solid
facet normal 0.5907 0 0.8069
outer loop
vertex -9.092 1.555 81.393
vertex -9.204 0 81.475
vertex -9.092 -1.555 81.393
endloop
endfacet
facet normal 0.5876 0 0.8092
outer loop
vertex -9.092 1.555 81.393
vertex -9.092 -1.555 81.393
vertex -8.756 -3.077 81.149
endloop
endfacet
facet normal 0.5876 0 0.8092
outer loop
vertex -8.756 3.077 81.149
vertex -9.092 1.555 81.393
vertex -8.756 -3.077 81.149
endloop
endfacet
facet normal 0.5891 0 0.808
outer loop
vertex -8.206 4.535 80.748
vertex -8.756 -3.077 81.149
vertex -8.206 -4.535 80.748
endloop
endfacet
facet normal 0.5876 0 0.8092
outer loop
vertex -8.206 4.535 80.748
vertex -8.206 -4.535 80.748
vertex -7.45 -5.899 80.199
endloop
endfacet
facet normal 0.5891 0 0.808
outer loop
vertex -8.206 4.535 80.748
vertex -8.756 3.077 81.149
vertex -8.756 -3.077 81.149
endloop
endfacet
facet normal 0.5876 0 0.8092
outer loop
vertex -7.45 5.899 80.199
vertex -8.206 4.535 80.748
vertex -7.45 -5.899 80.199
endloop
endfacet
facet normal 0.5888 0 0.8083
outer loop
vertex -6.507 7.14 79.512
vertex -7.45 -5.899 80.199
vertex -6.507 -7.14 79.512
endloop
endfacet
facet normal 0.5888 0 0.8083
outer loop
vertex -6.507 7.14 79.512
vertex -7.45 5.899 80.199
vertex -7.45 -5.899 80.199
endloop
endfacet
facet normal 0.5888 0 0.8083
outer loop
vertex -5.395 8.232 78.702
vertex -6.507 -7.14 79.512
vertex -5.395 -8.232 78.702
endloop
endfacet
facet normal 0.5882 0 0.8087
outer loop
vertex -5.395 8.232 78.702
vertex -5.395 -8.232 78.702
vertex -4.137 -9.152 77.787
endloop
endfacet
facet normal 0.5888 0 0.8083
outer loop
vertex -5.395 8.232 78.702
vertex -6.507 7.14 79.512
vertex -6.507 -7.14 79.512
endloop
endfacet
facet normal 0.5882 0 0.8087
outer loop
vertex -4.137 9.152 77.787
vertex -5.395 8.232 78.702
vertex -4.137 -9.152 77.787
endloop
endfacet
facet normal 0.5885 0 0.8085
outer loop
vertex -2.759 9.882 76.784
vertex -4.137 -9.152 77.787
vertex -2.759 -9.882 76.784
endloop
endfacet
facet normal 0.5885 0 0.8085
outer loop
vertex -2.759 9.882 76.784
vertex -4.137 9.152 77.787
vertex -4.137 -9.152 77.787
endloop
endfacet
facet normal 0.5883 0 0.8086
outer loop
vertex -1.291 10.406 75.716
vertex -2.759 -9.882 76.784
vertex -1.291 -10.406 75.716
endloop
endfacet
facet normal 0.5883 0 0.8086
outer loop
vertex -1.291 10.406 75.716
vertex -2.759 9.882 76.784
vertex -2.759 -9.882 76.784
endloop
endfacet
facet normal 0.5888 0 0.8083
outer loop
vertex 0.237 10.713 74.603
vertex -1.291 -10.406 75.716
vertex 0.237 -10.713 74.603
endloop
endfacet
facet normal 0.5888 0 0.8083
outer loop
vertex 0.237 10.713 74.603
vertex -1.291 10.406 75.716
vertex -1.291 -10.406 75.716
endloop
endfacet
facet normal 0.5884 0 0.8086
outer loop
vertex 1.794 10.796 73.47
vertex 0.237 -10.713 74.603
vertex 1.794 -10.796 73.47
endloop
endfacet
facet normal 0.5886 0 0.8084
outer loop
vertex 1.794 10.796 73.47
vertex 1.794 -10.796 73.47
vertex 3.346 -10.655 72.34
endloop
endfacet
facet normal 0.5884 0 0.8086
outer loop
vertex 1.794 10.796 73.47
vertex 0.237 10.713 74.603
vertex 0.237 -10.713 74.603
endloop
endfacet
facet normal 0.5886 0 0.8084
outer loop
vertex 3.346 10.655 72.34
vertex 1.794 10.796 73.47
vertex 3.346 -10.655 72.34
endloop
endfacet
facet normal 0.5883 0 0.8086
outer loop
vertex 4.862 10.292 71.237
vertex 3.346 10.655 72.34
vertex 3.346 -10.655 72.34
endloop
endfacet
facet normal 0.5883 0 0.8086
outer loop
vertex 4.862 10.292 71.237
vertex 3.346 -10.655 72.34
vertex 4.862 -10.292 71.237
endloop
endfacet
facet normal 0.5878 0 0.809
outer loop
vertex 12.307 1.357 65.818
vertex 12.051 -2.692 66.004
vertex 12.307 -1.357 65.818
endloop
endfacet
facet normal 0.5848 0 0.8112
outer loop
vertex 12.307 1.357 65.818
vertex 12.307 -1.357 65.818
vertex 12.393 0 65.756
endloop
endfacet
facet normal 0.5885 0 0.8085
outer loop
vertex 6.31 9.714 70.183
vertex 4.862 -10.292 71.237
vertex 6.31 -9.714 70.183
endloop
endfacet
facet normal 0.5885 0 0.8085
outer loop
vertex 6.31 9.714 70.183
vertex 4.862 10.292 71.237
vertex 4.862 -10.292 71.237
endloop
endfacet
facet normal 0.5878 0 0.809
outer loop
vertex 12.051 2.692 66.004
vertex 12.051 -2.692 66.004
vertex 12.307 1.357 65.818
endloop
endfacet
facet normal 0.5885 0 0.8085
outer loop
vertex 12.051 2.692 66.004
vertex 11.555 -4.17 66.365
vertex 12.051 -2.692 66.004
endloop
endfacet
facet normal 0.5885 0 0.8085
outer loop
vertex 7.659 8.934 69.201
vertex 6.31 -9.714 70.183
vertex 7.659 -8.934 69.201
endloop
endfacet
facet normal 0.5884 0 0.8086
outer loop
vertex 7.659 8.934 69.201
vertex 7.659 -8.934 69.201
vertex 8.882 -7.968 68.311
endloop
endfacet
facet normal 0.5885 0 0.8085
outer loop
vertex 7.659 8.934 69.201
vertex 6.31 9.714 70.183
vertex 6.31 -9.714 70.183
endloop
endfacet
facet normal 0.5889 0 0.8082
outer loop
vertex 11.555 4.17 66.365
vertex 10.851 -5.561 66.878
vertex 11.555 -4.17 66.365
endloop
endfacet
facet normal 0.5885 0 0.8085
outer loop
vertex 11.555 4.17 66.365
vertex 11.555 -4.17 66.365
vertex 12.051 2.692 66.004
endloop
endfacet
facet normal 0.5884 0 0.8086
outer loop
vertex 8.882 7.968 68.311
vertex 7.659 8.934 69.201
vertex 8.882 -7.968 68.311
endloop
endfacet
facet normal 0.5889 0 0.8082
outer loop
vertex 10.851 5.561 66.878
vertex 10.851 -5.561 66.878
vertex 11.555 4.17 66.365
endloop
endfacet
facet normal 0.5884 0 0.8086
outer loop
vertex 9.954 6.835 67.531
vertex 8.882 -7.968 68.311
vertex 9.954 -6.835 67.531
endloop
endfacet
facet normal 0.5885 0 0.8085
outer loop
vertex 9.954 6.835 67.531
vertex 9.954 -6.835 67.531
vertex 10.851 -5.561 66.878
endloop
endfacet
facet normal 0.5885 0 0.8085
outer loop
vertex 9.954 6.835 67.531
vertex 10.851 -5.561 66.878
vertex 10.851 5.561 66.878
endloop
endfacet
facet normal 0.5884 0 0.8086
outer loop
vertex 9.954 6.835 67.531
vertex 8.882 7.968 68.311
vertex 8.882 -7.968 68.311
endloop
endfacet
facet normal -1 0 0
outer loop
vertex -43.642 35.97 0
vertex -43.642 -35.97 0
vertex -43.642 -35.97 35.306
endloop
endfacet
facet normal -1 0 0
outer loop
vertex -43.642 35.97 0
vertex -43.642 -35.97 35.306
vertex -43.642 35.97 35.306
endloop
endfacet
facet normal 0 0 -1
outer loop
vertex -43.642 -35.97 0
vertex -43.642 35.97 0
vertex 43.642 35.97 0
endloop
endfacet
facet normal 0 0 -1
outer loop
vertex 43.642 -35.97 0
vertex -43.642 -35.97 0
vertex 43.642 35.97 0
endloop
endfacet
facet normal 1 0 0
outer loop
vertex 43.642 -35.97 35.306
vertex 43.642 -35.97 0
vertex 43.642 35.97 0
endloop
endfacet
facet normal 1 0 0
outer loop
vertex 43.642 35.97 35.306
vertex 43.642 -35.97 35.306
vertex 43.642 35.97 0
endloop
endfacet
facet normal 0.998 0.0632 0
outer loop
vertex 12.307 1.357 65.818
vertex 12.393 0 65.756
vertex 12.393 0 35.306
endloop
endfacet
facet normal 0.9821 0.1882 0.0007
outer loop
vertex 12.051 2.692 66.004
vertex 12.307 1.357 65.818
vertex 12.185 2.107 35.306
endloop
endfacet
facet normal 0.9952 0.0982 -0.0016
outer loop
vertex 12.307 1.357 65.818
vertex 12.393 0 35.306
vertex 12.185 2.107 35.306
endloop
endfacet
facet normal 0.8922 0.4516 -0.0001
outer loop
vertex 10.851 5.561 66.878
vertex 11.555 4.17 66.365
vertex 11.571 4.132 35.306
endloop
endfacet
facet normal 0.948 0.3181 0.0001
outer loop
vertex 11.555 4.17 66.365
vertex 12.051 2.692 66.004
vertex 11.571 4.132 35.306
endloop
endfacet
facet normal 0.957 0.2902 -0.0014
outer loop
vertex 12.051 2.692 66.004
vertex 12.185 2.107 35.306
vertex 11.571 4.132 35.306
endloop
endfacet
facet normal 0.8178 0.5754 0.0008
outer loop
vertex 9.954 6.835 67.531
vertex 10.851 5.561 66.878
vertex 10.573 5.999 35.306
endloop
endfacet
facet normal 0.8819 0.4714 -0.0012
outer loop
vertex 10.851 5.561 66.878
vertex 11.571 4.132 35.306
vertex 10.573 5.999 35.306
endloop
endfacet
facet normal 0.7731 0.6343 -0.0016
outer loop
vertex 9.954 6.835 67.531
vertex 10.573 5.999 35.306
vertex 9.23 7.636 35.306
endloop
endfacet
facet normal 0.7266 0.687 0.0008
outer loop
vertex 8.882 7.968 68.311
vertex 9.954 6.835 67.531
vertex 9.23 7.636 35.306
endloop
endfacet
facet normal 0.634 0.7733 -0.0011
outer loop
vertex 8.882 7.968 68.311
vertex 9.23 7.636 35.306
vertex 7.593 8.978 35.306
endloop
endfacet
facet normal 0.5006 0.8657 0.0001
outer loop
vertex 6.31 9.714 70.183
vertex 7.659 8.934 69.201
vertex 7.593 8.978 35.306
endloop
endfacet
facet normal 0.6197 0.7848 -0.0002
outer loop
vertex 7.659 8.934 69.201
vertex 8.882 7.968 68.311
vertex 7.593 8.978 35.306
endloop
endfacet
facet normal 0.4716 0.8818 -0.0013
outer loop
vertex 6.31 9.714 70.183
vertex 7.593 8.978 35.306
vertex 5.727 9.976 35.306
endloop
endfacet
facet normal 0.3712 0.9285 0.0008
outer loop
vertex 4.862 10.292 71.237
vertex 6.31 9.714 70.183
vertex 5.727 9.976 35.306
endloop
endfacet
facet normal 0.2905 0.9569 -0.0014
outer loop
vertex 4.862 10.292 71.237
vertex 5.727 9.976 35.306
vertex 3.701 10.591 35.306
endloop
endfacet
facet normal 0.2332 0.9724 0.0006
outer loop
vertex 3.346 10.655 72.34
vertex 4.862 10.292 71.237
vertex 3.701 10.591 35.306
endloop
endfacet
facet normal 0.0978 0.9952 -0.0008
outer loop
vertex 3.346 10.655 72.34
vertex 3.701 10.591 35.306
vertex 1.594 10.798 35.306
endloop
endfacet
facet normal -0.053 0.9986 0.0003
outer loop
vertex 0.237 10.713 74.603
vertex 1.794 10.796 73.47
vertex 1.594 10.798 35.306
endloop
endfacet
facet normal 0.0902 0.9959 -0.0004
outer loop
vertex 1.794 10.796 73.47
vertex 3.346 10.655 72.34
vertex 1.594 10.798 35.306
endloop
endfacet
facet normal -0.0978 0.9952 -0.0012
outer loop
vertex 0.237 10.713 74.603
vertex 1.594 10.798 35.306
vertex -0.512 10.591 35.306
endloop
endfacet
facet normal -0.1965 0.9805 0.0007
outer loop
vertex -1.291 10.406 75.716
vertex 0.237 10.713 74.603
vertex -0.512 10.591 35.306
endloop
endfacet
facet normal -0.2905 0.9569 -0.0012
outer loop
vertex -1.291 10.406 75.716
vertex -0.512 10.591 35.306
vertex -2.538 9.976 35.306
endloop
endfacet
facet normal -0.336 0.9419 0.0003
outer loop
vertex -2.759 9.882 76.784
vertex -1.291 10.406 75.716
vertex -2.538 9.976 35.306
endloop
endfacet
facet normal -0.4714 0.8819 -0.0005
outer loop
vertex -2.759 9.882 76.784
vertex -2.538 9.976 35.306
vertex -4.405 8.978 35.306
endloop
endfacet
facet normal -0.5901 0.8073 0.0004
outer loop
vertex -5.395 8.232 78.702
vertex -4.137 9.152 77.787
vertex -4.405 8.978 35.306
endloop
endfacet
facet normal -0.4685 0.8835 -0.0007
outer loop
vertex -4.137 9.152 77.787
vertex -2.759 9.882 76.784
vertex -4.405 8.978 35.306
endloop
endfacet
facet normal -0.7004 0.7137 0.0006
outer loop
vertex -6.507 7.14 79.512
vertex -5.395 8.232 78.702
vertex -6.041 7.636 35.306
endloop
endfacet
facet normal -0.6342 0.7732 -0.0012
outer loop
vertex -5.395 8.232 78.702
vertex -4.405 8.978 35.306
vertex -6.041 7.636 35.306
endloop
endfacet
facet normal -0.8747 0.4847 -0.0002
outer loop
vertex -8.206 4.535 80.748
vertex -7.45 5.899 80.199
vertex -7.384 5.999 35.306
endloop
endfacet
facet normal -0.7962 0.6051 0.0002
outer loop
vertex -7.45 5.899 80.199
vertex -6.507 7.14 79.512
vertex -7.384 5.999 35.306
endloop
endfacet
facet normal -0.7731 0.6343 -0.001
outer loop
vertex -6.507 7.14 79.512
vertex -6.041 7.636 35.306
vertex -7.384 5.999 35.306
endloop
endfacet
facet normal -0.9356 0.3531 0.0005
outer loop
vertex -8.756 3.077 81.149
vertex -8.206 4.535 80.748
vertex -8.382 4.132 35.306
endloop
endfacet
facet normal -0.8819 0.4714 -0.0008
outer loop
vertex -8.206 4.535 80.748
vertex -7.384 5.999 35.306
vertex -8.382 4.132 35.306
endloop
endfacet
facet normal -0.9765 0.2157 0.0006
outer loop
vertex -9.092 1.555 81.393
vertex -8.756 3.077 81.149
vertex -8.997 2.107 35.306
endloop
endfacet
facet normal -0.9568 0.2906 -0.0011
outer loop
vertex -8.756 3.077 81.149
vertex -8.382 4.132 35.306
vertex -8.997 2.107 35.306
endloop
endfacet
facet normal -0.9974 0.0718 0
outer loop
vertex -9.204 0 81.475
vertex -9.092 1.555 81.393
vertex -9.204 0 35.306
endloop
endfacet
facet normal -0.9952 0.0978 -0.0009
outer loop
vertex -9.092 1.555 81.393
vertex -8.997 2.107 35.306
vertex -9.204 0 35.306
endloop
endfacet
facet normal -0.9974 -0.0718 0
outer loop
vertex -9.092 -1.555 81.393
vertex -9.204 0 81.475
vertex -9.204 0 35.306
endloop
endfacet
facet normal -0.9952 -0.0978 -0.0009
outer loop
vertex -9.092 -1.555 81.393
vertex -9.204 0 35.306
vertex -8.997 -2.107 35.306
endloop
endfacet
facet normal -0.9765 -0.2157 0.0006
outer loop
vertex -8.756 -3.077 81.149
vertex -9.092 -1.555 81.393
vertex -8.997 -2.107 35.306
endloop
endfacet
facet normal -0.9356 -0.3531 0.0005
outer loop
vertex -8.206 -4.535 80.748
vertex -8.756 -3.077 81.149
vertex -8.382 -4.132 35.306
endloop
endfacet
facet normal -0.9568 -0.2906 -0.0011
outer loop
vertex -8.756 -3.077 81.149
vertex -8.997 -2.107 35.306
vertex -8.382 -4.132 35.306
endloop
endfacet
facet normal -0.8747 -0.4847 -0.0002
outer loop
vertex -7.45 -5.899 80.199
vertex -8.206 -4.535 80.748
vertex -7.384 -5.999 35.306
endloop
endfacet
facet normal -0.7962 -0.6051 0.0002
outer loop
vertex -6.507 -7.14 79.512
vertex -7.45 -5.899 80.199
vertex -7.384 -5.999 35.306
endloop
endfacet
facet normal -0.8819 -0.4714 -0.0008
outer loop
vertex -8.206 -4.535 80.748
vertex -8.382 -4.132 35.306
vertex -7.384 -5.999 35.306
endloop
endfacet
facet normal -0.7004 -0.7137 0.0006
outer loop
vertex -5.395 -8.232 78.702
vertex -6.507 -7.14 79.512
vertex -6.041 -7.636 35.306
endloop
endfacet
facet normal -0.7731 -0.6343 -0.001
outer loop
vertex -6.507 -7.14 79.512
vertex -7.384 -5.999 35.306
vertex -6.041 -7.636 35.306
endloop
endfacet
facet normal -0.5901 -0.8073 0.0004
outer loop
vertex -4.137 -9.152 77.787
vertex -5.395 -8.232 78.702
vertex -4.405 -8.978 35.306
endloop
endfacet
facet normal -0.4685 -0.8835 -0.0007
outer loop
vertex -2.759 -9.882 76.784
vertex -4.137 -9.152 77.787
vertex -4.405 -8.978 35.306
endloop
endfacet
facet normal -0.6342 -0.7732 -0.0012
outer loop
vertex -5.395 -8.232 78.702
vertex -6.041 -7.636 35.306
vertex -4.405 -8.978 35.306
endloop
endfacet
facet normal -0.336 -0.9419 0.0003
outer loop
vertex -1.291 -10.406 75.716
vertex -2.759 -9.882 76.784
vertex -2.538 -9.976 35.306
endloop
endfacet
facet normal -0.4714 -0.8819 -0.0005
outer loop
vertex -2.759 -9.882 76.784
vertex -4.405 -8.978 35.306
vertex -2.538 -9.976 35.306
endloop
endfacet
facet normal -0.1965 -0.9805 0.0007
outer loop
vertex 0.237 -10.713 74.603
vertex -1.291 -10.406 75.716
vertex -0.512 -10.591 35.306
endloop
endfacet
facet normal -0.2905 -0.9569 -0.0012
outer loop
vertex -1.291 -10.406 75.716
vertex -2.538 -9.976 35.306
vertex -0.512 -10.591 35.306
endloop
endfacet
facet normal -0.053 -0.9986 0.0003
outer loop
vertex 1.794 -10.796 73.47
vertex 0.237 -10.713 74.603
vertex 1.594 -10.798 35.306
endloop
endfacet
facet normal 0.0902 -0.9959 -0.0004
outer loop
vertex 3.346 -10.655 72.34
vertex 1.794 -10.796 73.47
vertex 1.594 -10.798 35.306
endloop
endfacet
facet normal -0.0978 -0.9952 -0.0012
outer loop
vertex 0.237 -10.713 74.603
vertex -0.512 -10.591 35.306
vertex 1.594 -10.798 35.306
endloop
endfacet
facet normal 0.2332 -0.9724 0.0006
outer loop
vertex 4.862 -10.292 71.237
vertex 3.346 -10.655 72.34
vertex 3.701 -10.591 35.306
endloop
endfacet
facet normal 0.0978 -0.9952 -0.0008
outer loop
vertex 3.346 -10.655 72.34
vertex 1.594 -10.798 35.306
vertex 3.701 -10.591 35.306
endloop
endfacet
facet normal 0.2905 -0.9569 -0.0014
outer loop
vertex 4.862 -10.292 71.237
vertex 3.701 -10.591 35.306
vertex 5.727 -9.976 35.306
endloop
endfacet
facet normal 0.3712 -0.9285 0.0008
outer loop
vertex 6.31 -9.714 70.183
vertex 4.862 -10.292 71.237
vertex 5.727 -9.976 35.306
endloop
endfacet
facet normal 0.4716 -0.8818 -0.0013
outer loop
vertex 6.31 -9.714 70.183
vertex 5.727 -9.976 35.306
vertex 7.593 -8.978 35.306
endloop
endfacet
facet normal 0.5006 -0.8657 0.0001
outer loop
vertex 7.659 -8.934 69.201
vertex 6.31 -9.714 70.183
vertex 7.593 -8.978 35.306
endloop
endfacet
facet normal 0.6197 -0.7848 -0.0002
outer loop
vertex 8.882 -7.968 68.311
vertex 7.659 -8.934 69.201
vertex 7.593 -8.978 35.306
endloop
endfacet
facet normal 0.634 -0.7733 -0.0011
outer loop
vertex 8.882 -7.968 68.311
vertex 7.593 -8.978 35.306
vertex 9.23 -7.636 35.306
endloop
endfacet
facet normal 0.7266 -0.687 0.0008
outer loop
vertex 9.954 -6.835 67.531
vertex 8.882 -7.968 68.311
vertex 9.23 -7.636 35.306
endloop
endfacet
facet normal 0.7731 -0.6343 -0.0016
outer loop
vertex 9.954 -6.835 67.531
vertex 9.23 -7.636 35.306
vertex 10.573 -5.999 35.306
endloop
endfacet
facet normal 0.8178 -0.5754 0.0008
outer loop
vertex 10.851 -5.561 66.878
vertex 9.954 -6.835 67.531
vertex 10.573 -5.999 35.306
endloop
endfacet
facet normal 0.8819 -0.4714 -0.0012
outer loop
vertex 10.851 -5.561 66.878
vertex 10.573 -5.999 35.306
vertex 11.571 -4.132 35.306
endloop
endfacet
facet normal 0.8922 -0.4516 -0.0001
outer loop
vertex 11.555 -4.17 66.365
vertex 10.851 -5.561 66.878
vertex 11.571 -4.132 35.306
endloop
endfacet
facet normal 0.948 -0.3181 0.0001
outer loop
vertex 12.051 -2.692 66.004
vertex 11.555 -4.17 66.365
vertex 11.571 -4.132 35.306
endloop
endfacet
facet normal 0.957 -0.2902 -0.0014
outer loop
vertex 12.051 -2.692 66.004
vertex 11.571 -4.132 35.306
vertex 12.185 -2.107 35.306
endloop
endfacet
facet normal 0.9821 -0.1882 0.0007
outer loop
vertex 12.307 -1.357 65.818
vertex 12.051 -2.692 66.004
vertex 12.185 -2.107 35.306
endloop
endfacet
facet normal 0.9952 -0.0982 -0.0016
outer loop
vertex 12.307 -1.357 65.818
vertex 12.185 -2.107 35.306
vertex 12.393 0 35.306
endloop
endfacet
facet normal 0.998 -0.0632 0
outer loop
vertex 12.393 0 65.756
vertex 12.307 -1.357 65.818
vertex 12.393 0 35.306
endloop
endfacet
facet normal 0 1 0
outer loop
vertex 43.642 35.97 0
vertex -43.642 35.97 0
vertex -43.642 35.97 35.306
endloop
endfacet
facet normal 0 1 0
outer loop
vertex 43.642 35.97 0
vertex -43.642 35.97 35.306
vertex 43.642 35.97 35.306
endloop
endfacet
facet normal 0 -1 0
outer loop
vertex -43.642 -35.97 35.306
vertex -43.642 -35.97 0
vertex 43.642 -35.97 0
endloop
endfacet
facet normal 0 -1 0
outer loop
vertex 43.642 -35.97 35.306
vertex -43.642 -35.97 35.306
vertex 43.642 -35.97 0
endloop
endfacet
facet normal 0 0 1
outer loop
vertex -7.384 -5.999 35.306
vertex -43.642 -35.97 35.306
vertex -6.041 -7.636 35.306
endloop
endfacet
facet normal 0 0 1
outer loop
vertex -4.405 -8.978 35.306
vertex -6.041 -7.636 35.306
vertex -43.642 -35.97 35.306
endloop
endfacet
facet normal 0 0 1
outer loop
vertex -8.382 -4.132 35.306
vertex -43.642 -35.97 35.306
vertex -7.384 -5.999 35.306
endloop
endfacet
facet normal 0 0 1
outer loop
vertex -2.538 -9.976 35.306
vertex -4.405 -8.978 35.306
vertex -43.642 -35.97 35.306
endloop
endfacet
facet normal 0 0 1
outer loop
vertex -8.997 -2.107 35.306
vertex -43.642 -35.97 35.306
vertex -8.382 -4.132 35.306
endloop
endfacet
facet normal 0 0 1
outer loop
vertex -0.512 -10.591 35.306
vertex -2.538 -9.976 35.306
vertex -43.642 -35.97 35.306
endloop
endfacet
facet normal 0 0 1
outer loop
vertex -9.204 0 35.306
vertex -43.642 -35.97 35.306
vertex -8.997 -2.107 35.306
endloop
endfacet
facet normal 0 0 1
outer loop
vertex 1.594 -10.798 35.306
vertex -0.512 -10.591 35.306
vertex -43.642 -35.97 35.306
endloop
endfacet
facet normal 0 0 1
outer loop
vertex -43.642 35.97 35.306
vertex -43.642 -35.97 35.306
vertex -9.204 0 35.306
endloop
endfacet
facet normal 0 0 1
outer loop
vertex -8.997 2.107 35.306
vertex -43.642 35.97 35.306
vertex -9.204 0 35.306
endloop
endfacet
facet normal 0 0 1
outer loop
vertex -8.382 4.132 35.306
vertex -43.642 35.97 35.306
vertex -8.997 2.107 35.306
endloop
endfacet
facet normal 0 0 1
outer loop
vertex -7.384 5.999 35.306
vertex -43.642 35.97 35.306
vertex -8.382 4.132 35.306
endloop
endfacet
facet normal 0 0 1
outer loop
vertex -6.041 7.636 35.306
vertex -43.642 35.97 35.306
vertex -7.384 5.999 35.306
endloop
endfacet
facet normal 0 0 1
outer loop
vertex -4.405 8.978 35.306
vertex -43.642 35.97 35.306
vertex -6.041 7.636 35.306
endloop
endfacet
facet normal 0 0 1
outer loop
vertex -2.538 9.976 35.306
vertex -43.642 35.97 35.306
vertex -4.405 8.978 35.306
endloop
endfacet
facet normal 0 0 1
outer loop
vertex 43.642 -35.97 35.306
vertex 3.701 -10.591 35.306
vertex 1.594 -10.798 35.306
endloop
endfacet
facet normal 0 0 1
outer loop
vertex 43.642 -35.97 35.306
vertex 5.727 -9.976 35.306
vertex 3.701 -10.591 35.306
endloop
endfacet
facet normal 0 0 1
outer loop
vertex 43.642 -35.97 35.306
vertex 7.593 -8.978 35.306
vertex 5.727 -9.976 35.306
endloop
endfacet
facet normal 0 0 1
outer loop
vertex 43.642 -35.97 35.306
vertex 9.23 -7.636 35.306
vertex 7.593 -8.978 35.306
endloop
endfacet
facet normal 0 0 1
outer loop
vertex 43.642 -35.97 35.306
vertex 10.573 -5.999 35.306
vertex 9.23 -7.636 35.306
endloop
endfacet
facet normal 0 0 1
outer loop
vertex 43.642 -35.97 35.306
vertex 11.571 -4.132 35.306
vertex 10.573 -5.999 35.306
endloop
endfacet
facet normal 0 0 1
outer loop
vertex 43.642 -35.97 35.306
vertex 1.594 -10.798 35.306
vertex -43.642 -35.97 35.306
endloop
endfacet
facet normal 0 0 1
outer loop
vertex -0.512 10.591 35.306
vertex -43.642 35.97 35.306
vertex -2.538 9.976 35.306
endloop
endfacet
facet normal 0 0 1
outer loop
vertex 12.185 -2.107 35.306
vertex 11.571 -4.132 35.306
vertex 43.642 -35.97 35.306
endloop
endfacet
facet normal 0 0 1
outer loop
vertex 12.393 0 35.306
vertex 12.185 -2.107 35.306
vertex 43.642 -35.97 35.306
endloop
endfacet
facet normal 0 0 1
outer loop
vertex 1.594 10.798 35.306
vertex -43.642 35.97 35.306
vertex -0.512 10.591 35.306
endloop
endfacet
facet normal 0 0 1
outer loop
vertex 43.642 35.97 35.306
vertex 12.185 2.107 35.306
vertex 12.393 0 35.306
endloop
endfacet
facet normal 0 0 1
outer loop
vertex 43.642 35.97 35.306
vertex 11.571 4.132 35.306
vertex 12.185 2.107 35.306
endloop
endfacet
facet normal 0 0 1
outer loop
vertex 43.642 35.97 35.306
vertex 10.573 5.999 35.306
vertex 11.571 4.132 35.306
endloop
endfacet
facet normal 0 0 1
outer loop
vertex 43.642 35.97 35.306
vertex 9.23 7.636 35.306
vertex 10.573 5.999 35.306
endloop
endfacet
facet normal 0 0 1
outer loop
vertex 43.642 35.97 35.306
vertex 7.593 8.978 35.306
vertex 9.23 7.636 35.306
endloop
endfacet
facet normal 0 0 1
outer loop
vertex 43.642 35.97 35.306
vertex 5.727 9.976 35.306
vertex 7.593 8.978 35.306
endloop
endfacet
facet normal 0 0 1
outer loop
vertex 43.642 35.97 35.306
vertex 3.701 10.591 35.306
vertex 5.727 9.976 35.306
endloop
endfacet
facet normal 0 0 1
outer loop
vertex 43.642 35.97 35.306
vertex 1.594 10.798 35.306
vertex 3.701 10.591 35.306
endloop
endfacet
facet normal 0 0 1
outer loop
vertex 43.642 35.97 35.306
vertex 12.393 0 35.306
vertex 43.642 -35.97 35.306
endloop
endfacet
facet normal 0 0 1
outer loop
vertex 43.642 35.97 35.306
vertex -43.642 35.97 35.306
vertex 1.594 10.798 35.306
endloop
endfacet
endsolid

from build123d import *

# Parameters (mm, degrees)
F0_R          = 10.7982965202
F1_DEPTH      = 86.614
F0_W          = 87.2836336493
F0_H          = 71.939252317
F2_DEPTH      = 35.306
F4_DEPTH      = 25.4
F4_DEPTH_BACK = 25.4


with BuildPart() as f1:
    # F0 (on Top) → F1 (new body)
    with BuildSketch(Plane.XY):
        with Locations((1.5942216851, 0)):
            Circle(F0_R)
    extrude(amount=F1_DEPTH)

    # F0 (on Top) → F2 (join)
    with BuildSketch(Plane.XY):
        Rectangle(F0_W, F0_H)
        with Locations((1.5942216851, 0)):
            Circle(F0_R, mode=Mode.SUBTRACT)
    extrude(amount=F2_DEPTH)

    # F3 (on Front) → F4 (cut, two sides)
    with BuildSketch(Plane.XZ) as f4_sk:
        Polygon((33.4245190024, 102.3935750127), (-31.5084643662, 97.7098867297), (33.4245190024, 50.4471883178), align=None)
    extrude(amount=-F4_DEPTH, mode=Mode.SUBTRACT)
    extrude(f4_sk.sketch, amount=F4_DEPTH_BACK, mode=Mode.SUBTRACT)


solid = f1.part
